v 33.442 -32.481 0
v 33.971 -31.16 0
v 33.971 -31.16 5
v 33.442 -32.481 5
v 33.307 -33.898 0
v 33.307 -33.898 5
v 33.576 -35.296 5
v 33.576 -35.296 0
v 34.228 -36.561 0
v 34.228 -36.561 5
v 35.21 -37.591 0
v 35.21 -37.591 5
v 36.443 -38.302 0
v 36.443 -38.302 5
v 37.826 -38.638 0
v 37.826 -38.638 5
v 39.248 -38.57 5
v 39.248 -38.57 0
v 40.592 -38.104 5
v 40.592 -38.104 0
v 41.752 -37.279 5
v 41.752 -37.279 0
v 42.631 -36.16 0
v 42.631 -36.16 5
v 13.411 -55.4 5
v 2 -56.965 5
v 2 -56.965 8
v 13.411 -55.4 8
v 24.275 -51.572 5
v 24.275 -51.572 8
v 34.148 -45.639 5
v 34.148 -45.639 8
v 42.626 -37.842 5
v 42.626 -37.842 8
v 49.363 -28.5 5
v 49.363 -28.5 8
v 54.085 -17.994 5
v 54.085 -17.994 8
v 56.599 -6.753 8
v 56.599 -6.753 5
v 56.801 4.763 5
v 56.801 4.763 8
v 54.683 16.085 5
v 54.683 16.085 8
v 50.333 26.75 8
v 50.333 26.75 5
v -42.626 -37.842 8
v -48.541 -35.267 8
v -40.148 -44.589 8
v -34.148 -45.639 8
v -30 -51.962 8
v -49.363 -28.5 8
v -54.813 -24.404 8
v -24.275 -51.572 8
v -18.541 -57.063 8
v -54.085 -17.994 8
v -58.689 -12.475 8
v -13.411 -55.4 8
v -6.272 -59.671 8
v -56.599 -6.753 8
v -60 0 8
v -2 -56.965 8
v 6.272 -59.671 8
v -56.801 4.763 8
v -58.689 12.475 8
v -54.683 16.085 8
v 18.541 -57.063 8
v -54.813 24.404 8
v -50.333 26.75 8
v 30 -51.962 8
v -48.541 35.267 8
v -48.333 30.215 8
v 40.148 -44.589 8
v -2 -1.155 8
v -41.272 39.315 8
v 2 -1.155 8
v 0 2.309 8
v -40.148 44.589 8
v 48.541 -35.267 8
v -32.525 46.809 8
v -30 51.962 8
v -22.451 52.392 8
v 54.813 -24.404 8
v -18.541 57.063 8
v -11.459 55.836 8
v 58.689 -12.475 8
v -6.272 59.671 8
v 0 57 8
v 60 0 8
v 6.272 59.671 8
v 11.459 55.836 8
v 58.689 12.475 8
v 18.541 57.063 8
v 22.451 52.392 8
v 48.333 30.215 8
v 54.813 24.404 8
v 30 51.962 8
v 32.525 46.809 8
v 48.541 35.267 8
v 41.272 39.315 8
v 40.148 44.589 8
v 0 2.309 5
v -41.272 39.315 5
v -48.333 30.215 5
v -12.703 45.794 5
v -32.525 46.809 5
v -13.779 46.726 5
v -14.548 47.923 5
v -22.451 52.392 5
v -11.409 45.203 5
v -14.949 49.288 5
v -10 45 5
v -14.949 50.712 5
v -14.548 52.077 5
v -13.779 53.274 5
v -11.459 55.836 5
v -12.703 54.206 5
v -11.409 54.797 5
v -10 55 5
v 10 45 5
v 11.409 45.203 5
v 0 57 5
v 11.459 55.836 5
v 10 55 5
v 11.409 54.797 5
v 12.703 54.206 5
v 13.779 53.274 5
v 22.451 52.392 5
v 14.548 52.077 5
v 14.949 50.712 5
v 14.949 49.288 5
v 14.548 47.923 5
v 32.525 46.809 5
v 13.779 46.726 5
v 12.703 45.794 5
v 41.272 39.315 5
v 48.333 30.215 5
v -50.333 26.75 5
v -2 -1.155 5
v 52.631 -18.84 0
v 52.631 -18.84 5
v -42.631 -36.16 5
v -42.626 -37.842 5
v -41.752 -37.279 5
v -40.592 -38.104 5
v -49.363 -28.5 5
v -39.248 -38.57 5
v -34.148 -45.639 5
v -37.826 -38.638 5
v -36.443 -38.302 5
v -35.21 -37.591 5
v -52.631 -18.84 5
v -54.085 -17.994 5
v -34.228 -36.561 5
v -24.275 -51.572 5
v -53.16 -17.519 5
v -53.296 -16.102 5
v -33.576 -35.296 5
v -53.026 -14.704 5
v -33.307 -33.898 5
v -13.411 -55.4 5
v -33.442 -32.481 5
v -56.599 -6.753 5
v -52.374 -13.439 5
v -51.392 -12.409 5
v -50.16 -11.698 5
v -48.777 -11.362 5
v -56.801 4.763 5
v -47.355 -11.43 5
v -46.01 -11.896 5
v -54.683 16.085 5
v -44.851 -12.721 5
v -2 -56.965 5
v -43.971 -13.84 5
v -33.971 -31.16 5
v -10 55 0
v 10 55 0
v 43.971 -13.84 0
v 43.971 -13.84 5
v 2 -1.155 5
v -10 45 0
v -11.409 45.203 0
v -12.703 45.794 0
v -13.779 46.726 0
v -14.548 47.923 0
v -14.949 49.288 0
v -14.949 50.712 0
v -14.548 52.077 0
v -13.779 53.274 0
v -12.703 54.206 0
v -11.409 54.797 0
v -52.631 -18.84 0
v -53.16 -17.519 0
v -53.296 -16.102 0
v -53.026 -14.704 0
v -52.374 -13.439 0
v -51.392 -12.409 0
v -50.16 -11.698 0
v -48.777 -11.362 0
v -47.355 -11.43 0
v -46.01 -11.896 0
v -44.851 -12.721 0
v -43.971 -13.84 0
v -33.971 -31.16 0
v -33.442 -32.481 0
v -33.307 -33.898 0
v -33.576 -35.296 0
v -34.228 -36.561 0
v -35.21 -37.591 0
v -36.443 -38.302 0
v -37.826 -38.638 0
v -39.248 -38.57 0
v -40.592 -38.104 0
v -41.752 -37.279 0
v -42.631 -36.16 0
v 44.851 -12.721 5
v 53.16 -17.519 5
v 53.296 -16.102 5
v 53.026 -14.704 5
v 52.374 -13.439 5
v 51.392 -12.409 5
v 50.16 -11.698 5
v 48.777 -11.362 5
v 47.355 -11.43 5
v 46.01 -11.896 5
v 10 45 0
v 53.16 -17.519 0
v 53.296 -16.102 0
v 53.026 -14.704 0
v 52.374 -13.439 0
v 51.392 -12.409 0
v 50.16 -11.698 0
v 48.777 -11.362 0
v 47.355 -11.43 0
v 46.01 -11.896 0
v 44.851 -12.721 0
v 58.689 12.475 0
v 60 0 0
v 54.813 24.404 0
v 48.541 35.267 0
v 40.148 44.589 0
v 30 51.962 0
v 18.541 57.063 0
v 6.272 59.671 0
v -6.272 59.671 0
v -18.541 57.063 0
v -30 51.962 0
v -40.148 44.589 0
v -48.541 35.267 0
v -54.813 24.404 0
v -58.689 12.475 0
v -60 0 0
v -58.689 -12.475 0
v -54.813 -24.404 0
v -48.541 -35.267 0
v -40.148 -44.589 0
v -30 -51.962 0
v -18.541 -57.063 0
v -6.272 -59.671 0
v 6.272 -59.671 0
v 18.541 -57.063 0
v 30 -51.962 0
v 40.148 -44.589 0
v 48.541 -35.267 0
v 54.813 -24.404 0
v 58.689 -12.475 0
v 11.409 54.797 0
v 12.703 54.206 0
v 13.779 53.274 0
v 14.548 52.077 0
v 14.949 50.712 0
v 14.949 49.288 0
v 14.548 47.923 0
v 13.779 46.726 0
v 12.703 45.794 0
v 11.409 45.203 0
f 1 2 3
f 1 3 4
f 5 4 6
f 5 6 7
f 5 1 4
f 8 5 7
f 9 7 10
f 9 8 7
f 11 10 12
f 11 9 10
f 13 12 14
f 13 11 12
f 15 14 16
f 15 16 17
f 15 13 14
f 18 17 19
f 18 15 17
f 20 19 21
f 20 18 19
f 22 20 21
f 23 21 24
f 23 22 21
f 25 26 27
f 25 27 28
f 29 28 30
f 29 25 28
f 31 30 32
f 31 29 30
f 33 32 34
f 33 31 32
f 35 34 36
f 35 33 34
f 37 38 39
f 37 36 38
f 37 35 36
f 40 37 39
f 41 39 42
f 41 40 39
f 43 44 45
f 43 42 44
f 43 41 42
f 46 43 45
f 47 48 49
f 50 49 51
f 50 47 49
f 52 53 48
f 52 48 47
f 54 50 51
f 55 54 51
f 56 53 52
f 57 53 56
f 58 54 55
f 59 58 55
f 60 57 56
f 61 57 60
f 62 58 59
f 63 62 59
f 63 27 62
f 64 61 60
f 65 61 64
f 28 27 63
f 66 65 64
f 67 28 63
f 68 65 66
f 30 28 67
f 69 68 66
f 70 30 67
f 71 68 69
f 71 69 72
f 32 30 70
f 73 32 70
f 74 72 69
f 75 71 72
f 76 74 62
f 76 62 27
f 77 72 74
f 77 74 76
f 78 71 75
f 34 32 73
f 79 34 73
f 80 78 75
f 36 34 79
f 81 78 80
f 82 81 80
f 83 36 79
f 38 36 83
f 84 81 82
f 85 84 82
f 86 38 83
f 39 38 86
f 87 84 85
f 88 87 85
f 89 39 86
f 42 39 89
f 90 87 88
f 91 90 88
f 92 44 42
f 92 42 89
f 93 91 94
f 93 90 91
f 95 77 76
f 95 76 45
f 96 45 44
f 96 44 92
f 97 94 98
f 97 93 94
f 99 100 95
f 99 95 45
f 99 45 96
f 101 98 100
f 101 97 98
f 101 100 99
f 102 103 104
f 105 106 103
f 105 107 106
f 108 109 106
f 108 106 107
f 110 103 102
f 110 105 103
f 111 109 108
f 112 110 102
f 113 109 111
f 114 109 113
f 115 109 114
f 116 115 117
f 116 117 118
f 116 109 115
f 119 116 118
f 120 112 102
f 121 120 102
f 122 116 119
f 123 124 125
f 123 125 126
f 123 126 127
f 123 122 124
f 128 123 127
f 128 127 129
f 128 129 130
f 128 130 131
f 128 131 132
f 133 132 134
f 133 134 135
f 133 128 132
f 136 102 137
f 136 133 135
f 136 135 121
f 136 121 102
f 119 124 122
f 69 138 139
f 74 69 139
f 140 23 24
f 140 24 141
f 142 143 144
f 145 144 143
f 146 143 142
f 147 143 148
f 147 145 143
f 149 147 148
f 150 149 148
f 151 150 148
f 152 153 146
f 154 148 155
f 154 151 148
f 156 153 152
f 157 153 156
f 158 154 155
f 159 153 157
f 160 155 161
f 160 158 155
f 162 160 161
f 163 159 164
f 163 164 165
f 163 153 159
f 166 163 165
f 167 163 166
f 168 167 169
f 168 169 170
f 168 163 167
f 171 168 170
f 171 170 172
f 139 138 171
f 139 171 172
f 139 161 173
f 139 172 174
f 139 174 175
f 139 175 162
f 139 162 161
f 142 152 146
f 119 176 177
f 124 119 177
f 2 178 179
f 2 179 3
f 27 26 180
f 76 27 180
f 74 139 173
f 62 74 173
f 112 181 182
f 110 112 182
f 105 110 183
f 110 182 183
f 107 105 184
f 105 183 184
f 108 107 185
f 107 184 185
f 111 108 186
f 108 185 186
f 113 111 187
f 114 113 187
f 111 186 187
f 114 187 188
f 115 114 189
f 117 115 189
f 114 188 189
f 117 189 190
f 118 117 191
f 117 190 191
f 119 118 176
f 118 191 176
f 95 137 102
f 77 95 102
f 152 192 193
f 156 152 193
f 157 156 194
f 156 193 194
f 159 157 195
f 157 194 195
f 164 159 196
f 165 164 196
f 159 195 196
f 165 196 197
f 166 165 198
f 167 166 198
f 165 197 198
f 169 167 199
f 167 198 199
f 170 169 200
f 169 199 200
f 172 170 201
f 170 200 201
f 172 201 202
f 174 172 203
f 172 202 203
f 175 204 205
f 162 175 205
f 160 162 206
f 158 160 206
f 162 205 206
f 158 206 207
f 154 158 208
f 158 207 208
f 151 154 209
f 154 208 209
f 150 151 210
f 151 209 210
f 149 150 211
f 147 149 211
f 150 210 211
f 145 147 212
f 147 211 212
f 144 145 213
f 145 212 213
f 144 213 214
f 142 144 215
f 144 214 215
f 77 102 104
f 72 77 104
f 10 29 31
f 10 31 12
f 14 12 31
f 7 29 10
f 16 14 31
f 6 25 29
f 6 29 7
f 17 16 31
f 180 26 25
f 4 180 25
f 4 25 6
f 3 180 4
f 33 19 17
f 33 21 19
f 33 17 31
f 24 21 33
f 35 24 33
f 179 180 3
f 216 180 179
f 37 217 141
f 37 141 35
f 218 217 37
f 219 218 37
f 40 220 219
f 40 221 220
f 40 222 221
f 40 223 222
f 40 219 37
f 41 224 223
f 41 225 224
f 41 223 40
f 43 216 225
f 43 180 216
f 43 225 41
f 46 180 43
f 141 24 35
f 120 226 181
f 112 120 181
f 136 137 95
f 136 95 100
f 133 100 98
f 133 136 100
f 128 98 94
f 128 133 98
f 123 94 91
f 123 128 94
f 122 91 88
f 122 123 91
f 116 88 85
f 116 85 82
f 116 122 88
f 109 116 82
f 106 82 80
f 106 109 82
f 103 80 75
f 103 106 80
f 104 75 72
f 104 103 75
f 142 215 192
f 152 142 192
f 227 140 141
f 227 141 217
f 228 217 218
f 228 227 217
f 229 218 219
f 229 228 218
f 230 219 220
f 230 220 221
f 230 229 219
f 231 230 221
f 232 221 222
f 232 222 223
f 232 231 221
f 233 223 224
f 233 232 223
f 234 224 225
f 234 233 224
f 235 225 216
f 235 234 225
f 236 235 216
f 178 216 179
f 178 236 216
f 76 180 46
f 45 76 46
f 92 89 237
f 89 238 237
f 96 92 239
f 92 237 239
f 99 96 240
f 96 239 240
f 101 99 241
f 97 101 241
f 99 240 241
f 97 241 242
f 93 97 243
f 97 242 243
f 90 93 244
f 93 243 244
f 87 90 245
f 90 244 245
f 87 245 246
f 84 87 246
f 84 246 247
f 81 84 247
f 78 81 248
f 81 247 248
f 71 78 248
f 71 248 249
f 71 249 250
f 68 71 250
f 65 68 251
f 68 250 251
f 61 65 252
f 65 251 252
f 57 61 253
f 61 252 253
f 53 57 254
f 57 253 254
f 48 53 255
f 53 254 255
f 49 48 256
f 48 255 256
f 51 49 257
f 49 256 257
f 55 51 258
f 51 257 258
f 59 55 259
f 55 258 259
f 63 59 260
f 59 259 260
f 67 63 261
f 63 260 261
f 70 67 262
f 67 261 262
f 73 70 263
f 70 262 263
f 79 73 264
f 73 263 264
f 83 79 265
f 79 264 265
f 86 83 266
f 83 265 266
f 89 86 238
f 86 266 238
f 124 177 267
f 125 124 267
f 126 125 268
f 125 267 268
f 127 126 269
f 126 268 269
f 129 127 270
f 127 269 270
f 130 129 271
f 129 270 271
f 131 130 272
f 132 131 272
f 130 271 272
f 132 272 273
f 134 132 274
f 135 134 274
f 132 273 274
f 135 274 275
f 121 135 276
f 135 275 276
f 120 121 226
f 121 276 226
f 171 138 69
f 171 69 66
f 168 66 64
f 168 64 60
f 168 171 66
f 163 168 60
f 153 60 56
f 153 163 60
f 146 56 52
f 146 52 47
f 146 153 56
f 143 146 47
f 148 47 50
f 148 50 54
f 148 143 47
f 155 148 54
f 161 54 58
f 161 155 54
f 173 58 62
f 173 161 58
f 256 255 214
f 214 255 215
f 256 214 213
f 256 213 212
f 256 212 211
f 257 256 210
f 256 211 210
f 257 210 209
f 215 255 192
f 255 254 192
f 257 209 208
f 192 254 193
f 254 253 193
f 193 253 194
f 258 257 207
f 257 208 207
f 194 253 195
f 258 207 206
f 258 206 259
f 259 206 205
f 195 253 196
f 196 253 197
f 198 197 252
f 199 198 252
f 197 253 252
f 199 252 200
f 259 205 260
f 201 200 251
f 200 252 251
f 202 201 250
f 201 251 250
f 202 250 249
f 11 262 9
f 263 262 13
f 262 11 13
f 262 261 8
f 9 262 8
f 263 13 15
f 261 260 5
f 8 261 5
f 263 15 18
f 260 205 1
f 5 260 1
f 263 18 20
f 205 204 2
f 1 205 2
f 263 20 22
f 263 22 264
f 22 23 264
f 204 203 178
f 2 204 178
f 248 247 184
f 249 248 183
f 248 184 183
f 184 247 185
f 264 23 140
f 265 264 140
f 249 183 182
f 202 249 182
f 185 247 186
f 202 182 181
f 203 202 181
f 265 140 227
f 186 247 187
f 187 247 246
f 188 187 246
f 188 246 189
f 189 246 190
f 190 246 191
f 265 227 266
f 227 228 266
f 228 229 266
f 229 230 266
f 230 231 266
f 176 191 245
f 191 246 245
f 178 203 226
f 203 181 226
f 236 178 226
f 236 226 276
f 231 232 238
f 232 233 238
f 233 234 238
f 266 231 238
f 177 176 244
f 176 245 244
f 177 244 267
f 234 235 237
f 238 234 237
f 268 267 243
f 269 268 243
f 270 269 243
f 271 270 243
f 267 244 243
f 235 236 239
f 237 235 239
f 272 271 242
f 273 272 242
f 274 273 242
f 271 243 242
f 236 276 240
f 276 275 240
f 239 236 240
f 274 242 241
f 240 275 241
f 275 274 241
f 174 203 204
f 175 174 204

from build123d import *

# Parameters (mm, degrees)
SKETCH_1_R      = 60
EXTRUDE_1_DEPTH = 5
SKETCH_2_R      = 60
SKETCH_2_R_2    = 57
EXTRUDE_2_DEPTH = 3
EXTRUDE_3_DEPTH = 3


with BuildPart() as part:
    # 草图1 → 凸台-拉伸1 (new body)
    with BuildSketch(Plane.XY):
        Circle(SKETCH_1_R)
        with BuildLine():
            Line((-43.97114317, -13.839745962), (-33.97114317, -31.160254038))
            ThreePointArc((-33.97114317, -31.160254038), (-35.801270189, -37.990381057), (-42.631397208, -36.160254038))
            Line((-42.631397208, -36.160254038), (-52.631397208, -18.839745962))
            ThreePointArc((-52.631397208, -18.839745962), (-50.801270189, -12.009618943), (-43.97114317, -13.839745962))
        make_face(mode=Mode.SUBTRACT)
        with BuildLine():
            Line((43.97114317, -13.839745962), (33.97114317, -31.160254038))
            ThreePointArc((33.97114317, -31.160254038), (35.801270189, -37.990381057), (42.631397208, -36.160254038))
            Line((42.631397208, -36.160254038), (52.631397208, -18.839745962))
            ThreePointArc((52.631397208, -18.839745962), (50.801270189, -12.009618943), (43.97114317, -13.839745962))
        make_face(mode=Mode.SUBTRACT)
        with BuildLine():
            Line((10, 45), (-10, 45))
            ThreePointArc((-10, 45), (-15, 50), (-10, 55))
            Line((-10, 55), (10, 55))
            ThreePointArc((10, 55), (15, 50), (10, 45))
        make_face(mode=Mode.SUBTRACT)
    extrude(amount=EXTRUDE_1_DEPTH)

    # 草图2 → 凸台-拉伸2 (add)
    with BuildSketch(Plane.XY.offset(5)):
        Circle(SKETCH_2_R)
        Circle(SKETCH_2_R_2, mode=Mode.SUBTRACT)
    extrude(amount=EXTRUDE_2_DEPTH)

    # 草图3 → 凸台-拉伸3 (add)
    with BuildSketch(Plane.XY.offset(5)):
        with BuildLine():
            Line((48.333051801, 30.214501545), (0, 2.309401077))
            Line((0, 2.309401077), (-48.333051801, 30.214501545))
            ThreePointArc((-48.333051801, 30.214501545), (-49.363448016, 28.5), (-50.333051801, 26.75039993))
            Line((-50.333051801, 26.75039993), (-2, -1.154700538))
            Line((-2, -1.154700538), (-2, -56.964901475))
            ThreePointArc((-2, -56.964901475), (0, -57), (2, -56.964901475))
            Line((2, -56.964901475), (2, -1.154700538))
            Line((2, -1.154700538), (50.333051801, 26.75039993))
            ThreePointArc((50.333051801, 26.75039993), (49.363448016, 28.5), (48.333051801, 30.214501545))
        make_face()
    extrude(amount=EXTRUDE_3_DEPTH)


solid = part.part
